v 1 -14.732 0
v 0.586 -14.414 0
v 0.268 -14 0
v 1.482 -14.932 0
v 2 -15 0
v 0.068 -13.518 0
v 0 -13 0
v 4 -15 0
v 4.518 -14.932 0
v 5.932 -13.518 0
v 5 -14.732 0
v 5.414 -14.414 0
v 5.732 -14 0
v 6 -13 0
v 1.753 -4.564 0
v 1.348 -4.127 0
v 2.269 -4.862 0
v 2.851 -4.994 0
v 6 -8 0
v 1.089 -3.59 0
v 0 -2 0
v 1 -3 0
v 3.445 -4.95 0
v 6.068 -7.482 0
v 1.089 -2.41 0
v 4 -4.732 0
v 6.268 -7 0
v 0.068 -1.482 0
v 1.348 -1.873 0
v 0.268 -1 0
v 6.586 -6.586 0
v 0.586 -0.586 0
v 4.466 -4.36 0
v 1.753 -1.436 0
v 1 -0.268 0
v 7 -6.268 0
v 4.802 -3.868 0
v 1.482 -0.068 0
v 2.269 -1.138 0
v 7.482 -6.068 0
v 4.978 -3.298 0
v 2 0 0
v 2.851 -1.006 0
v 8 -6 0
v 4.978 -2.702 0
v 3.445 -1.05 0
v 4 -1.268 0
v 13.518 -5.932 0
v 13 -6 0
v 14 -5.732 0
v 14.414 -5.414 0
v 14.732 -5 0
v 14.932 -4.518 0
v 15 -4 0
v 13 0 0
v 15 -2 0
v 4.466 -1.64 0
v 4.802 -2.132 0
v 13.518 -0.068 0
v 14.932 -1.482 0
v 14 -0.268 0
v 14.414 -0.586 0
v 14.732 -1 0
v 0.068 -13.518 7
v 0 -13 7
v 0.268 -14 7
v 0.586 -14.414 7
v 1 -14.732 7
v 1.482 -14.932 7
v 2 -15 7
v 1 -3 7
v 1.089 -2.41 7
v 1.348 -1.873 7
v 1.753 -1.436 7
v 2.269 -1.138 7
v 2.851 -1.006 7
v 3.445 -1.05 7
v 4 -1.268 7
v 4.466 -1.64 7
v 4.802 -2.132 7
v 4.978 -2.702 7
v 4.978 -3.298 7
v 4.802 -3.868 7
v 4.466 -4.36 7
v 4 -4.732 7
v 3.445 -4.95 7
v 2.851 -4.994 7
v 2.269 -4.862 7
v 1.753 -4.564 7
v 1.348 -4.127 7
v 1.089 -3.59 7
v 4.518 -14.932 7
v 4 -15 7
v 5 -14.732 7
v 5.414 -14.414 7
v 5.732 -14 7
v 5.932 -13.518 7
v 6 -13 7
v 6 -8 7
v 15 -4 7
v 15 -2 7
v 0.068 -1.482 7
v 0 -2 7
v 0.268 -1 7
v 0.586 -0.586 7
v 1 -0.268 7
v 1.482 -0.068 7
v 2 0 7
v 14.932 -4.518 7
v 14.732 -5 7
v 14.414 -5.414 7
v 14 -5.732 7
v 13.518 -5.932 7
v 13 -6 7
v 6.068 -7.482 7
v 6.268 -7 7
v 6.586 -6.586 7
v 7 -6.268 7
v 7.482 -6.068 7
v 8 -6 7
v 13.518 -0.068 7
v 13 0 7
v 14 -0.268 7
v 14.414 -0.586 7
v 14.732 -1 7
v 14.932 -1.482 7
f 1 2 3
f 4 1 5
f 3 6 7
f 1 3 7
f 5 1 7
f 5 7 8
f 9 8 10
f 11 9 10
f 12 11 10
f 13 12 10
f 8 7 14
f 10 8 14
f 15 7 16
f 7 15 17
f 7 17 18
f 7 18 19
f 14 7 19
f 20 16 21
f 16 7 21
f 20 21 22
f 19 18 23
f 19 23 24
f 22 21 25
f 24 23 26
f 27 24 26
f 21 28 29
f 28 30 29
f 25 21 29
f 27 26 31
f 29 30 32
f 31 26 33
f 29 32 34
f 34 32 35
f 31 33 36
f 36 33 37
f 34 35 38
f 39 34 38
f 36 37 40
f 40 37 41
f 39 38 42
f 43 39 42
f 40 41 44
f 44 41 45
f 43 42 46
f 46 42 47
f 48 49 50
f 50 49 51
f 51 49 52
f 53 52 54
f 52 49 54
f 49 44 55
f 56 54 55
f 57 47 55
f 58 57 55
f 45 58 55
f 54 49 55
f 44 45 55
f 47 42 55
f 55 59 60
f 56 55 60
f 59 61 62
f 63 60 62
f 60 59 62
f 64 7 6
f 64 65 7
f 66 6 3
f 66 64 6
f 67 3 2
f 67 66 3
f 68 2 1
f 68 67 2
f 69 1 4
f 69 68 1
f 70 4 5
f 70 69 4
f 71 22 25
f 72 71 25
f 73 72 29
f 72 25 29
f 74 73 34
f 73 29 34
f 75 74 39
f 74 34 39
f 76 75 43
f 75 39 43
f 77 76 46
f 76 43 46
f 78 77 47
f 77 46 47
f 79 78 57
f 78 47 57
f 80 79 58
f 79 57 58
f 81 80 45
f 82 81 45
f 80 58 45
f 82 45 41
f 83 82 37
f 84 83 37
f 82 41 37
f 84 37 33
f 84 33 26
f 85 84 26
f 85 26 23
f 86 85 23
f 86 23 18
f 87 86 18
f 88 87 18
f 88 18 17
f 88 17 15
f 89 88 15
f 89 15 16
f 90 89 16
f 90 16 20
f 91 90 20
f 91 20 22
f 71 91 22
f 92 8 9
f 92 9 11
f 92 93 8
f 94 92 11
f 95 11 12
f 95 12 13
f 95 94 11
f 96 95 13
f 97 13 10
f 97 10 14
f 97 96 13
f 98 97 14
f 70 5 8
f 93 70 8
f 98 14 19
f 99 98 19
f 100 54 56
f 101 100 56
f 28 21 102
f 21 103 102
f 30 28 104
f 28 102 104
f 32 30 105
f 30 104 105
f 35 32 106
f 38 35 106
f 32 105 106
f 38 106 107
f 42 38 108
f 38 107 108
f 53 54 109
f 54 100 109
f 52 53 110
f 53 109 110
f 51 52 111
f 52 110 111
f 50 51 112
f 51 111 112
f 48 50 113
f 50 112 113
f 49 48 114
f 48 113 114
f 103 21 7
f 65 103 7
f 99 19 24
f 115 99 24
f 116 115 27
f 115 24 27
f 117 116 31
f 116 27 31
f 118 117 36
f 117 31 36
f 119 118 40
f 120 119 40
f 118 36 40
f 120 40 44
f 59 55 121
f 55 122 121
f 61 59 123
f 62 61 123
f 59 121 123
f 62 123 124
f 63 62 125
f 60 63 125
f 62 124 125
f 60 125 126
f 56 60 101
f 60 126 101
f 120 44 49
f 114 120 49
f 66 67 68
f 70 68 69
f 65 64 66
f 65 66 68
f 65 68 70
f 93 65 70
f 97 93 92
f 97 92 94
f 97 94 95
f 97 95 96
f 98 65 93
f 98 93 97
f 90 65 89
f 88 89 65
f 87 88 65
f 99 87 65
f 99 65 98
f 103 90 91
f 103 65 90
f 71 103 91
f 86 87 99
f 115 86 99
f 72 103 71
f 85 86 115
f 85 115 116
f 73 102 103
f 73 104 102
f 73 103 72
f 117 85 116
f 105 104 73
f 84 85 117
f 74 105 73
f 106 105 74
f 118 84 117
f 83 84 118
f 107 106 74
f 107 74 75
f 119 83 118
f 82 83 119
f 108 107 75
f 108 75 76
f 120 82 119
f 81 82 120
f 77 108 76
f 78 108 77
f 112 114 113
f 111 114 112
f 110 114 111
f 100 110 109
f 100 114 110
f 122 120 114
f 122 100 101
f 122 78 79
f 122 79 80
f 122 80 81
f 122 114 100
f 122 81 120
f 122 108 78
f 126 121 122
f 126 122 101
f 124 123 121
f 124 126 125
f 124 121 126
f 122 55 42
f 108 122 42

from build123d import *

# Parameters (mm, degrees)
F1_DEPTH = 7
F3_D     = 4
F4_R     = 2


with BuildPart() as f1:
    # F0 (on Top) → F1 (new body)
    with BuildSketch(Plane.XY):
        with BuildLine():
            Line((0, 0), (0, -15))
            Line((0, -15), (6, -15))
            Line((6, -15), (6, -8))
            ThreePointArc((6, -8), (6.585786, -6.585786), (8, -6))
            Line((8, -6), (15, -6))
            Line((15, -6), (15, 0))
            Line((15, 0), (0, 0))
        make_face()
    extrude(amount=F1_DEPTH)

    # F3 (through all)
    with Locations(Plane.XY.offset(7)):
        with Locations((3, -3)):
            Hole(F3_D / 2)

    # F4
    f4_edges = [f1.edges().sort_by_distance(p)[0] for p in [
        (0, 0, 3.5),
        (0, -15, 3.5),
        (6, -15, 3.5),
        (15, -6, 3.5),
        (15, 0, 3.5),
    ]]
    fillet(f4_edges, radius=F4_R)


solid = f1.part
